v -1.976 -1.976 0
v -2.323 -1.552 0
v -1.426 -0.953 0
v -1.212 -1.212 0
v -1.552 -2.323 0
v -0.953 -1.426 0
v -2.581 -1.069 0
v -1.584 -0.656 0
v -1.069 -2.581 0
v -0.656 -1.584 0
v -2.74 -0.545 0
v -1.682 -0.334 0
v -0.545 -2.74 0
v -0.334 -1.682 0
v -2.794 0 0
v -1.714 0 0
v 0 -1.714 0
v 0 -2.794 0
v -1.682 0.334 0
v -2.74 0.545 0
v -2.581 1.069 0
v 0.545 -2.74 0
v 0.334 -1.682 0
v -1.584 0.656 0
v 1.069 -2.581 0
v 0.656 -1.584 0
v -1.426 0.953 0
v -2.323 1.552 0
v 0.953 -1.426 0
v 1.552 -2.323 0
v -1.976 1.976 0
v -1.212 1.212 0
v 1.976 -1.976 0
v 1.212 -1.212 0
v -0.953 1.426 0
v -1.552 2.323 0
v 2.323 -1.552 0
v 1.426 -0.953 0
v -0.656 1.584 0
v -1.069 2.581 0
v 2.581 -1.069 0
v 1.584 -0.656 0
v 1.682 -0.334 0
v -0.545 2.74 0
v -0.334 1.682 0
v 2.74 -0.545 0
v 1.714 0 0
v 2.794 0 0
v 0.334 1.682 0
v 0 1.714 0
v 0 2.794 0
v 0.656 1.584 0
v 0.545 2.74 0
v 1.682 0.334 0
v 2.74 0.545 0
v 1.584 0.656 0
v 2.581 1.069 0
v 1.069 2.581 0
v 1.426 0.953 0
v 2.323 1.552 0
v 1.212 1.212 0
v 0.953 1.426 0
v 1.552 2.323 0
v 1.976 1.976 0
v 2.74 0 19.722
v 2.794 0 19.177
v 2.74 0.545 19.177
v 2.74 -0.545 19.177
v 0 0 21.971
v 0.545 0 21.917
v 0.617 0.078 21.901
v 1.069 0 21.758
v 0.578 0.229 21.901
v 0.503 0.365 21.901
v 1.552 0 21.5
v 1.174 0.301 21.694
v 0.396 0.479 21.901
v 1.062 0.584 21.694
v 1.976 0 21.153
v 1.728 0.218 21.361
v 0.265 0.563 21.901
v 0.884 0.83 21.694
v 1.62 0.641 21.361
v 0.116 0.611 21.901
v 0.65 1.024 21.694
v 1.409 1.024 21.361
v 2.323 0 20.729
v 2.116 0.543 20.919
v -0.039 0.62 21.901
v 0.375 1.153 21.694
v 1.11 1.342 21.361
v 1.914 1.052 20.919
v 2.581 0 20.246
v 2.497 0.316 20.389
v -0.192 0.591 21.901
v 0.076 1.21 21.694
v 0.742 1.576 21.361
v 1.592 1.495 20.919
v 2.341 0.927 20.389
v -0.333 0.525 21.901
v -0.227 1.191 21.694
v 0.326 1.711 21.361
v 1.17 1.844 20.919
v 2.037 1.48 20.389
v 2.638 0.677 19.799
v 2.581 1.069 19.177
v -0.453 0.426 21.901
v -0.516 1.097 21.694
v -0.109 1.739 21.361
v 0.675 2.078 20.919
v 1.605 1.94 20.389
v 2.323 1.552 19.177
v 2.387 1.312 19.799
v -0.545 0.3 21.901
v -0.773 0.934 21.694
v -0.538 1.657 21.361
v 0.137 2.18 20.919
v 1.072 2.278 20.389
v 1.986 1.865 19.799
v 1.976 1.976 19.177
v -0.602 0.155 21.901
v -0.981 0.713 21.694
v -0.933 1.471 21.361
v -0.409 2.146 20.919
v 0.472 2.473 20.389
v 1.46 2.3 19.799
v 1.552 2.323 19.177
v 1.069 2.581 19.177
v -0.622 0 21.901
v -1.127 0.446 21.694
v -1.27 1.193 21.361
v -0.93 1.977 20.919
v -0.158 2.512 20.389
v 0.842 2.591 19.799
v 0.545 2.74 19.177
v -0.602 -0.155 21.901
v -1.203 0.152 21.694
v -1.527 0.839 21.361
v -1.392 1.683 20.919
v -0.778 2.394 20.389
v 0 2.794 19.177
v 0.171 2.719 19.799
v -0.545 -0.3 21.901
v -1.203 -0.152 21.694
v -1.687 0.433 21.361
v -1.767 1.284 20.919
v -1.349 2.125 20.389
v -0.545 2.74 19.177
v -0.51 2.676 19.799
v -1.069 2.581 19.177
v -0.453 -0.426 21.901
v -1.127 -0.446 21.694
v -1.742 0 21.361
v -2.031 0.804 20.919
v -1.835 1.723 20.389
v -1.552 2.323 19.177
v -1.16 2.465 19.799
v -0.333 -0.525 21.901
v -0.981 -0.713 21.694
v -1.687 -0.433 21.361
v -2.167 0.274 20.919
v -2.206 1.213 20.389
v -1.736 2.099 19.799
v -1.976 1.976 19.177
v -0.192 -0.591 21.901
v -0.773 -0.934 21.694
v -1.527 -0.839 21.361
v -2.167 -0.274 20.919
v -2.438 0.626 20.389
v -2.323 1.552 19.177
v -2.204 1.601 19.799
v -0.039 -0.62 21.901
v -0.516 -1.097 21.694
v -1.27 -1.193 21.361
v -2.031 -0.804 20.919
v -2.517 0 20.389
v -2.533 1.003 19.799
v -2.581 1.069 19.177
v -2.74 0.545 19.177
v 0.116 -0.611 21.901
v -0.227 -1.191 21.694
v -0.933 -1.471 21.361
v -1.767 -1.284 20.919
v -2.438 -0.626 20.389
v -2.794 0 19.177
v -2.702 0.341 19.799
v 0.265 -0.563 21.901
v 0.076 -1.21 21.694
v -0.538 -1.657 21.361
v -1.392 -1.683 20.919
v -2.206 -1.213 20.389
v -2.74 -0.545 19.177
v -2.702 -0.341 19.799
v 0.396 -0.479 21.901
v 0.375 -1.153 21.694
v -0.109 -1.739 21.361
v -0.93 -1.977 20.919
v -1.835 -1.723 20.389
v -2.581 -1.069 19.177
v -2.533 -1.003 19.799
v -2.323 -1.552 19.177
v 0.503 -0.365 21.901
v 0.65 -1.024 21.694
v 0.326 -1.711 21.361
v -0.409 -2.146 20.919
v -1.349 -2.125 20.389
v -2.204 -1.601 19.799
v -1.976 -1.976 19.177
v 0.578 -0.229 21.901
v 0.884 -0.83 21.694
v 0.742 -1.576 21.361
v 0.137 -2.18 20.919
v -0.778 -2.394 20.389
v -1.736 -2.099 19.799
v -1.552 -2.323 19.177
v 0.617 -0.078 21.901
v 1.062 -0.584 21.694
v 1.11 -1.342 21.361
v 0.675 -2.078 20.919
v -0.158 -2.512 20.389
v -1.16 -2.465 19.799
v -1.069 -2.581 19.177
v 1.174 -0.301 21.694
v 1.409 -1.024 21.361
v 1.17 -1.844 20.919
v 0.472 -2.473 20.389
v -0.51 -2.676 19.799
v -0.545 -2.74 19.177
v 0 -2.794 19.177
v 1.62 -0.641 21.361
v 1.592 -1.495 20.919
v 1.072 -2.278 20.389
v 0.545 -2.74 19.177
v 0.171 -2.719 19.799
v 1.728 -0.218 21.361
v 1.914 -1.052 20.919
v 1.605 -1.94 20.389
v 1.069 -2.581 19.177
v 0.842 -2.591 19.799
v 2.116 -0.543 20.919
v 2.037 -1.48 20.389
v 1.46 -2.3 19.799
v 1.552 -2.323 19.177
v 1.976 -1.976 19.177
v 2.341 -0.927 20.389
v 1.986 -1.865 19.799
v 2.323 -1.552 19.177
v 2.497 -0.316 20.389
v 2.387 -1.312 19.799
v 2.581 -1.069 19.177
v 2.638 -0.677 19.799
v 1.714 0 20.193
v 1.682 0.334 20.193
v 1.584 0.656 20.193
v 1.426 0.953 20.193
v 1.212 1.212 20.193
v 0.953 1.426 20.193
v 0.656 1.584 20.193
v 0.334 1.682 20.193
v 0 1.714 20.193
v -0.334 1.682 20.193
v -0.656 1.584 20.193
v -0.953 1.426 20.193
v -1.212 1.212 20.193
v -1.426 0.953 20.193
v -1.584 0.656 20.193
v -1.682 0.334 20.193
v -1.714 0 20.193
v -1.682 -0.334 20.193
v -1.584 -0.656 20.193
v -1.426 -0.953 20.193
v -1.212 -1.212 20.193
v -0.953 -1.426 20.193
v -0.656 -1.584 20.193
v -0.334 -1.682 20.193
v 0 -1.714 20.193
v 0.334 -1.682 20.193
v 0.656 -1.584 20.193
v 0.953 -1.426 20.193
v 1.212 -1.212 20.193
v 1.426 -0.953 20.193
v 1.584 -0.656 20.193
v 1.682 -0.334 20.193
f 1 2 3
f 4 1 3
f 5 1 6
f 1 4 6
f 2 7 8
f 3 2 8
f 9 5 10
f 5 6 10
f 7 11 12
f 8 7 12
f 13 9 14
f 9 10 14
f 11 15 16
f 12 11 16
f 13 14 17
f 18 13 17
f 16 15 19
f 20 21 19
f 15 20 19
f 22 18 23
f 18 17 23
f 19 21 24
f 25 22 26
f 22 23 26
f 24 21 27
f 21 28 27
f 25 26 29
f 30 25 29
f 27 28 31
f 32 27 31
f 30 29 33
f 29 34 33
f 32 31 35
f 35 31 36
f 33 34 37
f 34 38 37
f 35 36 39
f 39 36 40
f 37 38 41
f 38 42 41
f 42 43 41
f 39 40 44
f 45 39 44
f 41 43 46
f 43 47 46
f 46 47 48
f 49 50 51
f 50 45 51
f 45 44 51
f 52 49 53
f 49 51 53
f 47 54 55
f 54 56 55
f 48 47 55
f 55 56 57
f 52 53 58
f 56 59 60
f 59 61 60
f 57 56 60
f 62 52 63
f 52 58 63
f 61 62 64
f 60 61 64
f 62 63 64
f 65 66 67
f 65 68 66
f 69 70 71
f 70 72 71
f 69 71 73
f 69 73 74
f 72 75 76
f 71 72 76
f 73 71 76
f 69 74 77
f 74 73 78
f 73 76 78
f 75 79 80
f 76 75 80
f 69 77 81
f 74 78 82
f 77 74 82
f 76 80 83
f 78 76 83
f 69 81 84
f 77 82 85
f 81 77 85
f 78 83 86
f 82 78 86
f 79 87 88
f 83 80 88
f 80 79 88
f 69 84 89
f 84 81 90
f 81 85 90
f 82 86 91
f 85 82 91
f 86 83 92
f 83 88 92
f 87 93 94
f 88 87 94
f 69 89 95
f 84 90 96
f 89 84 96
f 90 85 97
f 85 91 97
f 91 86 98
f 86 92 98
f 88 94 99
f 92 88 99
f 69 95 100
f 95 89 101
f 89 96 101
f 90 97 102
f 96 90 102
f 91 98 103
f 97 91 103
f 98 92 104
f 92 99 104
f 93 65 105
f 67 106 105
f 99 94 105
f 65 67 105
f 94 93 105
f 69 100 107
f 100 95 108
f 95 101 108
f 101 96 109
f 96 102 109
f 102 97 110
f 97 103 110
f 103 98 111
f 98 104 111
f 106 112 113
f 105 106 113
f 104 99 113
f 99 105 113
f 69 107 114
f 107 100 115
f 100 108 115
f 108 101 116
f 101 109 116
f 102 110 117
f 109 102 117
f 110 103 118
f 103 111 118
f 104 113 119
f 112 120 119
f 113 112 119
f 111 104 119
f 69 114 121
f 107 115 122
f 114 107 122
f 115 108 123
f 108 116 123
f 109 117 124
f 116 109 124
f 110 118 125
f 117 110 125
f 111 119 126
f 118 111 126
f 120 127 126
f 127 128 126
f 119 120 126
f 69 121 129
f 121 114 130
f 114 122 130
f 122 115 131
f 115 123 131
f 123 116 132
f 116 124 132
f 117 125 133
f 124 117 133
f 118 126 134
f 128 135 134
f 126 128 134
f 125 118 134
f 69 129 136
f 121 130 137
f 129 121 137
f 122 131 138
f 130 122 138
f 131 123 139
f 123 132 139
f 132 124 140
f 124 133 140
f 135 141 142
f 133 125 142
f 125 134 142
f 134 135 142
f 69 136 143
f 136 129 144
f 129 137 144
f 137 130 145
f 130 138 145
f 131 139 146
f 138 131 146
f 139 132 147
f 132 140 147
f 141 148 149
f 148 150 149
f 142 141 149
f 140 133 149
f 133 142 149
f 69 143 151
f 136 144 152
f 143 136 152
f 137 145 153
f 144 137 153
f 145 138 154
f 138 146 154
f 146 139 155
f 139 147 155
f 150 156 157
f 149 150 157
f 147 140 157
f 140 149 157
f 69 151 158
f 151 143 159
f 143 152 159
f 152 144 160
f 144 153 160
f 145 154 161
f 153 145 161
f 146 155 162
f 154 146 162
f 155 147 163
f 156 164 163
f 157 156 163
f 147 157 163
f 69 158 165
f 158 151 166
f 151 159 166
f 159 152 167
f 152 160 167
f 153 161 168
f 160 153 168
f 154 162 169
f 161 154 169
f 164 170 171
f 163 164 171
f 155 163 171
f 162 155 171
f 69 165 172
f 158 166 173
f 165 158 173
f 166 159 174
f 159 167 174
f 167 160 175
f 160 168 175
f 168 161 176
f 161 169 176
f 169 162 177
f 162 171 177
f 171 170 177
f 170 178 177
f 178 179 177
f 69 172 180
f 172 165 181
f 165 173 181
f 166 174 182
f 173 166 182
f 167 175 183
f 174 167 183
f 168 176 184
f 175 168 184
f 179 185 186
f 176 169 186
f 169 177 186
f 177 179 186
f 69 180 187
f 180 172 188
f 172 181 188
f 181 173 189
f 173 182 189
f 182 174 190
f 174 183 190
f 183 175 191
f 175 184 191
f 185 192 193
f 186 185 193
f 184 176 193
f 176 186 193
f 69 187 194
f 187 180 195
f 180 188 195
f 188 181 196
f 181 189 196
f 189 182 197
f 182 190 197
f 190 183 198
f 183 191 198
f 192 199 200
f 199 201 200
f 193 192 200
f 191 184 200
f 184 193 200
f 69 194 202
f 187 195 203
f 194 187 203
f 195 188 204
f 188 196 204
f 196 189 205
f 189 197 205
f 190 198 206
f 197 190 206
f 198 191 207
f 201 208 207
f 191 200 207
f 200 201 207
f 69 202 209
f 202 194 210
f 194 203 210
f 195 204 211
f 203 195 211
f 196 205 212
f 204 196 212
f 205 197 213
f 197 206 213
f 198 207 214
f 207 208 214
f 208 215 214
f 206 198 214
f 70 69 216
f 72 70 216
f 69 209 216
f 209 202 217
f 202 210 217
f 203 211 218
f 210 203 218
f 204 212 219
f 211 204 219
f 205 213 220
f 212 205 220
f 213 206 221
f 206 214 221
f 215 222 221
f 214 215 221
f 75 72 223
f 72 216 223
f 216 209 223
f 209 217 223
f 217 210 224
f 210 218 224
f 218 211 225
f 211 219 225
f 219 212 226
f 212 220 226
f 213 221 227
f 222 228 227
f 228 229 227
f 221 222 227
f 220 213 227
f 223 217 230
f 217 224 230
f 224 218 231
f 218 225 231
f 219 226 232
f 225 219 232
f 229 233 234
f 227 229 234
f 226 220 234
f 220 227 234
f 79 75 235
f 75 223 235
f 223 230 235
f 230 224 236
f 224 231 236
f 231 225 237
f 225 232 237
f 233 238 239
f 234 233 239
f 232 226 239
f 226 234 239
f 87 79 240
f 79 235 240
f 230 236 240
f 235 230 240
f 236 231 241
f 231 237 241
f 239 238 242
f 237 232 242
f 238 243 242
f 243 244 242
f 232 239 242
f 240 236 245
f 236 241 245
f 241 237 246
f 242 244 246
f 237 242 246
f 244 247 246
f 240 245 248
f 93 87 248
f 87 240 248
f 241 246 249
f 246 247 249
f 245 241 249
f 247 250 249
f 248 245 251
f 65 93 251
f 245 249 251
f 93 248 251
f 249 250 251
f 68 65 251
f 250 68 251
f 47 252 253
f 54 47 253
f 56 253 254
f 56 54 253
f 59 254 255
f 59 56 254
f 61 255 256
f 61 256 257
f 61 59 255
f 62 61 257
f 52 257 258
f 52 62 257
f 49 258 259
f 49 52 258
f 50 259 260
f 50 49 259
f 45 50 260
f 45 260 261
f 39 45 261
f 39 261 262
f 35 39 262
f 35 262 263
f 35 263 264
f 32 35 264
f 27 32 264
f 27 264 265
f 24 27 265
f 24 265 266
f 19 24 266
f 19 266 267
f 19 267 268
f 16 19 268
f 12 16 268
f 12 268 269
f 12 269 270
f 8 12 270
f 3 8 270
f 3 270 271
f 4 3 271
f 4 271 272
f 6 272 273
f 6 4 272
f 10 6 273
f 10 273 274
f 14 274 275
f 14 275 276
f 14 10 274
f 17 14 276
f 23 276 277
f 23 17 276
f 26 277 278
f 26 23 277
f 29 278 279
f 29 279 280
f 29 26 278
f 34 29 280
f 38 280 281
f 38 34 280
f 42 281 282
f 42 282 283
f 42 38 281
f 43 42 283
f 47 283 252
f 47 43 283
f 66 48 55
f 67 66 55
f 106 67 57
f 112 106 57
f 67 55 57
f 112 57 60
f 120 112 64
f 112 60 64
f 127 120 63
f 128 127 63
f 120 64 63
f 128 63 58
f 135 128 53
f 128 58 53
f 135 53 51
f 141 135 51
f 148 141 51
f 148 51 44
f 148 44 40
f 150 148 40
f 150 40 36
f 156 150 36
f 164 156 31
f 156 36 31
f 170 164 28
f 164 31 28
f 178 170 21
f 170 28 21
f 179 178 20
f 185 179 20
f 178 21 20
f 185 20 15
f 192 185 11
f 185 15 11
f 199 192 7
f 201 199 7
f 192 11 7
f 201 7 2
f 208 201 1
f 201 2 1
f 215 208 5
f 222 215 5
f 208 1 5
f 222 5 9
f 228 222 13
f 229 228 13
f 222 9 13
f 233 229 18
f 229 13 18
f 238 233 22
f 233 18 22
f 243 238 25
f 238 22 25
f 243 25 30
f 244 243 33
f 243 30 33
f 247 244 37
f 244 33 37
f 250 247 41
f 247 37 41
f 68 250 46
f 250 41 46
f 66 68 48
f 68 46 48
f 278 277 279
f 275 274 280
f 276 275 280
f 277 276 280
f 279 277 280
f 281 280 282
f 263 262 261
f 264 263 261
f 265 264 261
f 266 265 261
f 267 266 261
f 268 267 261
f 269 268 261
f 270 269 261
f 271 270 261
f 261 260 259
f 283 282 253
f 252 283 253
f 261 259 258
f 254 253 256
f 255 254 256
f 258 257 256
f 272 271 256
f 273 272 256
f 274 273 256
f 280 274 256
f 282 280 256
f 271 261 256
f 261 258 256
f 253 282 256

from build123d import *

# Parameters (mm, degrees)
F0_R     = 2.794
F0_R_2   = 1.7145
F1_DEPTH = 21.971
F2_R     = 1.7145
F3_DEPTH = 1.778
F4_R     = 2.794


with BuildPart() as f1:
    # F0 (on Top) → F1 (new body)
    with BuildSketch(Plane.XY):
        Circle(F0_R)
        Circle(F0_R_2, mode=Mode.SUBTRACT)
    extrude(amount=F1_DEPTH)

    # F2 (on face) → F3 (join)
    with BuildSketch(Plane.XY.offset(21.971)):
        Circle(F2_R)
    extrude(amount=-F3_DEPTH)

    # F4
    f4_edges = [f1.edges().sort_by_distance(p)[0] for p in [
        (-2.794, 0, 21.971),
    ]]
    fillet(f4_edges, radius=F4_R)


solid = f1.part
